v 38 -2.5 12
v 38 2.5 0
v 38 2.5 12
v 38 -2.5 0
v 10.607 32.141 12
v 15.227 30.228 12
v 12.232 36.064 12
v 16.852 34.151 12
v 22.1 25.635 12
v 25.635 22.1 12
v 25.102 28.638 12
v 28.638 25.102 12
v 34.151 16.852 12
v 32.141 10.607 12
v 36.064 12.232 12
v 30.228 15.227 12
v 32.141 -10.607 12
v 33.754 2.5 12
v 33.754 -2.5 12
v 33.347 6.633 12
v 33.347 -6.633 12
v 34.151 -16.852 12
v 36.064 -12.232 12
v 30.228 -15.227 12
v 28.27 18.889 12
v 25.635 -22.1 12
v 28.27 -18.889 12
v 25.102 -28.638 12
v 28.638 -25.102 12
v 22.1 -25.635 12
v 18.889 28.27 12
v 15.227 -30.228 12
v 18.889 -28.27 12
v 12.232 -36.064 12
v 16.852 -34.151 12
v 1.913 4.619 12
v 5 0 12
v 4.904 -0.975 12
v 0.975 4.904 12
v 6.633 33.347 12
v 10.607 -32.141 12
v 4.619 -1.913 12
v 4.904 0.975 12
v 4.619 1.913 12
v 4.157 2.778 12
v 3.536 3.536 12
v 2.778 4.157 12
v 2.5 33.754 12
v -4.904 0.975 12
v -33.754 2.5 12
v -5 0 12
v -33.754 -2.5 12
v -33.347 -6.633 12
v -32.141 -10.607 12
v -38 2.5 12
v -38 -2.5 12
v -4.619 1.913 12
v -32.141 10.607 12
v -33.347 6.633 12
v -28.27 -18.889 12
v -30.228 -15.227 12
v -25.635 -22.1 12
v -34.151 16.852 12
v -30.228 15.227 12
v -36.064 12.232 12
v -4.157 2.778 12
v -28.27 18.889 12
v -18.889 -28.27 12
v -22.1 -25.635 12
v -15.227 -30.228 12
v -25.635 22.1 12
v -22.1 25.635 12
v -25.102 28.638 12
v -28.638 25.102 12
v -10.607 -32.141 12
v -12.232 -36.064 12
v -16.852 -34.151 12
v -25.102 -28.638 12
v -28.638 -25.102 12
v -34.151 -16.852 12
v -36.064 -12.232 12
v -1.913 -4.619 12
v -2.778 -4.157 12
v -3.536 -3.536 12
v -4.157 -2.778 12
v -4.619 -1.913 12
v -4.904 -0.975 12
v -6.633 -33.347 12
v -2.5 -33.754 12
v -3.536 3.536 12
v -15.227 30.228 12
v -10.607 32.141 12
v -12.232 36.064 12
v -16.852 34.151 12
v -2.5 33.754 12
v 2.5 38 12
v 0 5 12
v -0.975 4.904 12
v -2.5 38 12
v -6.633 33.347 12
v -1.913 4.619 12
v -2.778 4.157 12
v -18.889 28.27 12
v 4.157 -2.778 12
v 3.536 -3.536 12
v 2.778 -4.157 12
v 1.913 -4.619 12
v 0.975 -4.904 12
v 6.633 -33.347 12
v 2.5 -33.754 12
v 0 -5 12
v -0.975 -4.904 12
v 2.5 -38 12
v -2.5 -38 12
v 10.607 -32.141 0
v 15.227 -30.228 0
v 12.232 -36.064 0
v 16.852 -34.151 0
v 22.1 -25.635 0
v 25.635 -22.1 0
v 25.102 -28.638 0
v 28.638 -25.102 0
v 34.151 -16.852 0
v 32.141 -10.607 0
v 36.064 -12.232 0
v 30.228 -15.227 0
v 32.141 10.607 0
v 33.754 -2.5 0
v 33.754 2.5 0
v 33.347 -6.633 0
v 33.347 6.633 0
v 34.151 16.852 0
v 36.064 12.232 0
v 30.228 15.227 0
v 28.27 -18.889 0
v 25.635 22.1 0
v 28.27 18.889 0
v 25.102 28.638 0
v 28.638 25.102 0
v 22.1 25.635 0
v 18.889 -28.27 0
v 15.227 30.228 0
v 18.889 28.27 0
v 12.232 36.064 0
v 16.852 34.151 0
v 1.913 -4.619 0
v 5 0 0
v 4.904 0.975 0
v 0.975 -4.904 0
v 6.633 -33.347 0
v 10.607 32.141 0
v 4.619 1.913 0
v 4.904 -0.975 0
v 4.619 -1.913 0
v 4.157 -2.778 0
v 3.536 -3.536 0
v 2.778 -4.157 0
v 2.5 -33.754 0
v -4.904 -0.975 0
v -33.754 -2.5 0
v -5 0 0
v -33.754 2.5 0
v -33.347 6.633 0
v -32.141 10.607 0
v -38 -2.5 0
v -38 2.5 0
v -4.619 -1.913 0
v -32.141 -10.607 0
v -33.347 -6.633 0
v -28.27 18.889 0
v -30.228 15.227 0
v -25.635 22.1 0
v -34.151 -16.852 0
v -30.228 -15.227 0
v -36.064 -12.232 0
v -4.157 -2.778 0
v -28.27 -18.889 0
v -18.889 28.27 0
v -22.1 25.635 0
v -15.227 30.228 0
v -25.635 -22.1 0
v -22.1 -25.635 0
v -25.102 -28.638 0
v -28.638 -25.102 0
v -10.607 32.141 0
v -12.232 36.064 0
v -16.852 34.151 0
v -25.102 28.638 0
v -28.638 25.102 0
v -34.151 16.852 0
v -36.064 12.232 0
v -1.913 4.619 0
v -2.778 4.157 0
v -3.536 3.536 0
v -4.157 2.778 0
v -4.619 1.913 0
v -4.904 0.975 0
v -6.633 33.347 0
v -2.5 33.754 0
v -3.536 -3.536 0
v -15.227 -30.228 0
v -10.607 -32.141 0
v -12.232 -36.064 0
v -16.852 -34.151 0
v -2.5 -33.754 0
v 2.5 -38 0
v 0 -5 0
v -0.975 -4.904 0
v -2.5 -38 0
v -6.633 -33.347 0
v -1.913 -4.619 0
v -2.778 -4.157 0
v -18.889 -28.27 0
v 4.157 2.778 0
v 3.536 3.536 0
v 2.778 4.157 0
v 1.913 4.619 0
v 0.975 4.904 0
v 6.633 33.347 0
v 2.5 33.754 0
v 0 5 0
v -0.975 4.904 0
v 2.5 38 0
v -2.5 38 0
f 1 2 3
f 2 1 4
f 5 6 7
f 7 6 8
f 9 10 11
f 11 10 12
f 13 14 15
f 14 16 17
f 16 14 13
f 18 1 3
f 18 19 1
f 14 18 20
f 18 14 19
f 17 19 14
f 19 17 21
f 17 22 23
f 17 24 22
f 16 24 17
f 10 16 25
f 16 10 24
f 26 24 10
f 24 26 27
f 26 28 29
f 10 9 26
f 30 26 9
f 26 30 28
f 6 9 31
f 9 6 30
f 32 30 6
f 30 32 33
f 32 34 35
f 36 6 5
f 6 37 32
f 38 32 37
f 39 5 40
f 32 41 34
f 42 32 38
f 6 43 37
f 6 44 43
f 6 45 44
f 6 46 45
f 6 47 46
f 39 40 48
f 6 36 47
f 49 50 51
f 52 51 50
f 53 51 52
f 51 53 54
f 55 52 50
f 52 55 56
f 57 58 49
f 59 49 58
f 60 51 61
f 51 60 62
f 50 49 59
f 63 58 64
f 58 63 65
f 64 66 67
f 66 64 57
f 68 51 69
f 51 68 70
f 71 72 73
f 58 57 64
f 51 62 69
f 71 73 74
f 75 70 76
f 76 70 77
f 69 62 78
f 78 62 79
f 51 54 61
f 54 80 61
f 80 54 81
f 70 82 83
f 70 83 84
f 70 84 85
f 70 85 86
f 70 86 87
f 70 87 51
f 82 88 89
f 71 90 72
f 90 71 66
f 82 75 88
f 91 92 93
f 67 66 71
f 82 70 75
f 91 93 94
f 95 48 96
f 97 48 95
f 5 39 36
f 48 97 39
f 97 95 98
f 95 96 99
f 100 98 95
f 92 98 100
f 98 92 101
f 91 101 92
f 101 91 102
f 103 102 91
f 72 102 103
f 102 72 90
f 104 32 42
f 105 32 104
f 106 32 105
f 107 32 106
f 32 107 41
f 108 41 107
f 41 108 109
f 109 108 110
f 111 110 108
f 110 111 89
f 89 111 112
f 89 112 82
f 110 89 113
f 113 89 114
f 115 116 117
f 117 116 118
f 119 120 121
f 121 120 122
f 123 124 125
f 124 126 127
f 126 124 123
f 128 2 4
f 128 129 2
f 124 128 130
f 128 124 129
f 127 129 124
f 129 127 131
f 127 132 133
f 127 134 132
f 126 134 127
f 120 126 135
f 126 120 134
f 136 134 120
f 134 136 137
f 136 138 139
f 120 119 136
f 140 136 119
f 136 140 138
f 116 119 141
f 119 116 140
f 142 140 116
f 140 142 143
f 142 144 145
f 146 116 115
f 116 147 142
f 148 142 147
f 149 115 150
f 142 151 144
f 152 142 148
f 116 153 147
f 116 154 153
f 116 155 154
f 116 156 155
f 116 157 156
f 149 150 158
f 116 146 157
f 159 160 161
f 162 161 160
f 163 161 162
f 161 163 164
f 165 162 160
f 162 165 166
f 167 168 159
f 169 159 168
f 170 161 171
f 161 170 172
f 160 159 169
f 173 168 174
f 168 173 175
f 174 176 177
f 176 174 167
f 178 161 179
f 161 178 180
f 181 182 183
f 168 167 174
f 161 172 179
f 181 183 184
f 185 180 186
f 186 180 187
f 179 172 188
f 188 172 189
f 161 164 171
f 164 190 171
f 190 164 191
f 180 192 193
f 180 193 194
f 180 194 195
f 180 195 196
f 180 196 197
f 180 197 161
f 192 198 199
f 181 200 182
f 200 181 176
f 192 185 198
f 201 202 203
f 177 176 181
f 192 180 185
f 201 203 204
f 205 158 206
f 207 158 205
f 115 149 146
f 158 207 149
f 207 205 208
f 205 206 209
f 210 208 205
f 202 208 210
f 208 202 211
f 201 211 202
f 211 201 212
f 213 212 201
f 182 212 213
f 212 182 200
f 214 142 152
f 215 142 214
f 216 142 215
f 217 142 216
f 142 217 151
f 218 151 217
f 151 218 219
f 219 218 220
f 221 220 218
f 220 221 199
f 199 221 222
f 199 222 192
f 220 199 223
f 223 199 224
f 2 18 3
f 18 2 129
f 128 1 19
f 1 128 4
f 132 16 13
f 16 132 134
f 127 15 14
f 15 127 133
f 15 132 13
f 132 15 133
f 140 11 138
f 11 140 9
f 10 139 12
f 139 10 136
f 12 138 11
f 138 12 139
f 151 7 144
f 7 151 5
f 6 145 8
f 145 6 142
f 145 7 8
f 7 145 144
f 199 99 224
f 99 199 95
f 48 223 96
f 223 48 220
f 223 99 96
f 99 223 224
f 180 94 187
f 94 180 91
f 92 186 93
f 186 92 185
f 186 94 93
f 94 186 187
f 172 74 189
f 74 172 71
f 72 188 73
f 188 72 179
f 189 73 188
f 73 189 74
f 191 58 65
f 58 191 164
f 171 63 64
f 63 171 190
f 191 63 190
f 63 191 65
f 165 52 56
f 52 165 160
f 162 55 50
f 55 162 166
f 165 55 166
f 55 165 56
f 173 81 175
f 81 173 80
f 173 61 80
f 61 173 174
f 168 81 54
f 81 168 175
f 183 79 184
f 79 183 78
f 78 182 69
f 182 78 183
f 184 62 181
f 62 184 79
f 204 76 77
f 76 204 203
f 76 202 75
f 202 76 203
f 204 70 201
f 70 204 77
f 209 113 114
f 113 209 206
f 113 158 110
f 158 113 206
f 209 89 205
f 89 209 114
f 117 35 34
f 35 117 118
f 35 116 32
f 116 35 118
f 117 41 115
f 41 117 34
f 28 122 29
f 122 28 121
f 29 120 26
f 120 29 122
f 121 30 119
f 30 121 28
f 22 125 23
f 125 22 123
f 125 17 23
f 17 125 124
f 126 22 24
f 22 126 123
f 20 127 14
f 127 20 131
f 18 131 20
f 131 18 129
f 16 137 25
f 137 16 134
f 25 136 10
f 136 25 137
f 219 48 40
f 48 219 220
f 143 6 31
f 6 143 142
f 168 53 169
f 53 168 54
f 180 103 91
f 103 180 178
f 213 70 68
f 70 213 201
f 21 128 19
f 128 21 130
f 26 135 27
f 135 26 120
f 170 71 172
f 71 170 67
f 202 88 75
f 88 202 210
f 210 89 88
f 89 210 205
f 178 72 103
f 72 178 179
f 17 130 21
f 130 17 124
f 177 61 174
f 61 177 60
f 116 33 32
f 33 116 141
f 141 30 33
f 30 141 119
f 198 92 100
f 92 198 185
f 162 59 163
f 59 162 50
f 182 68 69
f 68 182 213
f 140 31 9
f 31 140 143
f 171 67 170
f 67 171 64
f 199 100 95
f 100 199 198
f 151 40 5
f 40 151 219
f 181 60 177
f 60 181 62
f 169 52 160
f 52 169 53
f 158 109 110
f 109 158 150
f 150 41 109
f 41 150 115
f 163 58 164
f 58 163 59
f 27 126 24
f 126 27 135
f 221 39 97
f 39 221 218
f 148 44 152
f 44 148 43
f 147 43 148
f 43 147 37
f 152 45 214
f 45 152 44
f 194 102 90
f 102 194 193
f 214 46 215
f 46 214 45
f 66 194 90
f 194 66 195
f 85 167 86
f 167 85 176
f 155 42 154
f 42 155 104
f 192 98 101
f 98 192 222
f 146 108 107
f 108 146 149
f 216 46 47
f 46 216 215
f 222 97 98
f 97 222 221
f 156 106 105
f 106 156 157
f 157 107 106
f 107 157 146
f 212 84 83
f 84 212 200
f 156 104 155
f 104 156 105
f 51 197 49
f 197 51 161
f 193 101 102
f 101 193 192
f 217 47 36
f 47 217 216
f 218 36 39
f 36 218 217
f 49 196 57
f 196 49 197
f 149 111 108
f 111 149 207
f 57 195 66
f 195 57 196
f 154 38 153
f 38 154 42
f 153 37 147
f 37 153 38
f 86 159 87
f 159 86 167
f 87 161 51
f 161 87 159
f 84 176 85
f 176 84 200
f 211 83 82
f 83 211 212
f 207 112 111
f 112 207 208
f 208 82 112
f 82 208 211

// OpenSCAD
$fn = 32;

// ----------------------------------------------------------------------
// Spur blank: bored gear blank
// ----------------------------------------------------------------------

// --- parameters (mm) ---
disc_r = 34;              // blank root radius
disc_t = 12;              // blank thickness
n_teeth = 16;             // stub tooth count
tooth_w = 5;              // tooth width at the root
tooth_h = 4;              // tooth height above the root
bore_r = 5;               // central bore radius

out_r = disc_r + tooth_h;  // tip radius
bbox_x = 76.0;  // measured width over the teeth
bbox_y = 76.0;  // measured depth over the teeth

difference() {
union() {
  cylinder(r = disc_r, h = disc_t);
  for (i = [0 : n_teeth - 1])
    rotate([0, 0, i * 360 / n_teeth])
      translate([disc_r - 1, -tooth_w / 2, 0])
        cube([tooth_h + 1, tooth_w, disc_t]);
}
  translate([0, 0, -1]) cylinder(r = bore_r, h = disc_t + 2);
}
